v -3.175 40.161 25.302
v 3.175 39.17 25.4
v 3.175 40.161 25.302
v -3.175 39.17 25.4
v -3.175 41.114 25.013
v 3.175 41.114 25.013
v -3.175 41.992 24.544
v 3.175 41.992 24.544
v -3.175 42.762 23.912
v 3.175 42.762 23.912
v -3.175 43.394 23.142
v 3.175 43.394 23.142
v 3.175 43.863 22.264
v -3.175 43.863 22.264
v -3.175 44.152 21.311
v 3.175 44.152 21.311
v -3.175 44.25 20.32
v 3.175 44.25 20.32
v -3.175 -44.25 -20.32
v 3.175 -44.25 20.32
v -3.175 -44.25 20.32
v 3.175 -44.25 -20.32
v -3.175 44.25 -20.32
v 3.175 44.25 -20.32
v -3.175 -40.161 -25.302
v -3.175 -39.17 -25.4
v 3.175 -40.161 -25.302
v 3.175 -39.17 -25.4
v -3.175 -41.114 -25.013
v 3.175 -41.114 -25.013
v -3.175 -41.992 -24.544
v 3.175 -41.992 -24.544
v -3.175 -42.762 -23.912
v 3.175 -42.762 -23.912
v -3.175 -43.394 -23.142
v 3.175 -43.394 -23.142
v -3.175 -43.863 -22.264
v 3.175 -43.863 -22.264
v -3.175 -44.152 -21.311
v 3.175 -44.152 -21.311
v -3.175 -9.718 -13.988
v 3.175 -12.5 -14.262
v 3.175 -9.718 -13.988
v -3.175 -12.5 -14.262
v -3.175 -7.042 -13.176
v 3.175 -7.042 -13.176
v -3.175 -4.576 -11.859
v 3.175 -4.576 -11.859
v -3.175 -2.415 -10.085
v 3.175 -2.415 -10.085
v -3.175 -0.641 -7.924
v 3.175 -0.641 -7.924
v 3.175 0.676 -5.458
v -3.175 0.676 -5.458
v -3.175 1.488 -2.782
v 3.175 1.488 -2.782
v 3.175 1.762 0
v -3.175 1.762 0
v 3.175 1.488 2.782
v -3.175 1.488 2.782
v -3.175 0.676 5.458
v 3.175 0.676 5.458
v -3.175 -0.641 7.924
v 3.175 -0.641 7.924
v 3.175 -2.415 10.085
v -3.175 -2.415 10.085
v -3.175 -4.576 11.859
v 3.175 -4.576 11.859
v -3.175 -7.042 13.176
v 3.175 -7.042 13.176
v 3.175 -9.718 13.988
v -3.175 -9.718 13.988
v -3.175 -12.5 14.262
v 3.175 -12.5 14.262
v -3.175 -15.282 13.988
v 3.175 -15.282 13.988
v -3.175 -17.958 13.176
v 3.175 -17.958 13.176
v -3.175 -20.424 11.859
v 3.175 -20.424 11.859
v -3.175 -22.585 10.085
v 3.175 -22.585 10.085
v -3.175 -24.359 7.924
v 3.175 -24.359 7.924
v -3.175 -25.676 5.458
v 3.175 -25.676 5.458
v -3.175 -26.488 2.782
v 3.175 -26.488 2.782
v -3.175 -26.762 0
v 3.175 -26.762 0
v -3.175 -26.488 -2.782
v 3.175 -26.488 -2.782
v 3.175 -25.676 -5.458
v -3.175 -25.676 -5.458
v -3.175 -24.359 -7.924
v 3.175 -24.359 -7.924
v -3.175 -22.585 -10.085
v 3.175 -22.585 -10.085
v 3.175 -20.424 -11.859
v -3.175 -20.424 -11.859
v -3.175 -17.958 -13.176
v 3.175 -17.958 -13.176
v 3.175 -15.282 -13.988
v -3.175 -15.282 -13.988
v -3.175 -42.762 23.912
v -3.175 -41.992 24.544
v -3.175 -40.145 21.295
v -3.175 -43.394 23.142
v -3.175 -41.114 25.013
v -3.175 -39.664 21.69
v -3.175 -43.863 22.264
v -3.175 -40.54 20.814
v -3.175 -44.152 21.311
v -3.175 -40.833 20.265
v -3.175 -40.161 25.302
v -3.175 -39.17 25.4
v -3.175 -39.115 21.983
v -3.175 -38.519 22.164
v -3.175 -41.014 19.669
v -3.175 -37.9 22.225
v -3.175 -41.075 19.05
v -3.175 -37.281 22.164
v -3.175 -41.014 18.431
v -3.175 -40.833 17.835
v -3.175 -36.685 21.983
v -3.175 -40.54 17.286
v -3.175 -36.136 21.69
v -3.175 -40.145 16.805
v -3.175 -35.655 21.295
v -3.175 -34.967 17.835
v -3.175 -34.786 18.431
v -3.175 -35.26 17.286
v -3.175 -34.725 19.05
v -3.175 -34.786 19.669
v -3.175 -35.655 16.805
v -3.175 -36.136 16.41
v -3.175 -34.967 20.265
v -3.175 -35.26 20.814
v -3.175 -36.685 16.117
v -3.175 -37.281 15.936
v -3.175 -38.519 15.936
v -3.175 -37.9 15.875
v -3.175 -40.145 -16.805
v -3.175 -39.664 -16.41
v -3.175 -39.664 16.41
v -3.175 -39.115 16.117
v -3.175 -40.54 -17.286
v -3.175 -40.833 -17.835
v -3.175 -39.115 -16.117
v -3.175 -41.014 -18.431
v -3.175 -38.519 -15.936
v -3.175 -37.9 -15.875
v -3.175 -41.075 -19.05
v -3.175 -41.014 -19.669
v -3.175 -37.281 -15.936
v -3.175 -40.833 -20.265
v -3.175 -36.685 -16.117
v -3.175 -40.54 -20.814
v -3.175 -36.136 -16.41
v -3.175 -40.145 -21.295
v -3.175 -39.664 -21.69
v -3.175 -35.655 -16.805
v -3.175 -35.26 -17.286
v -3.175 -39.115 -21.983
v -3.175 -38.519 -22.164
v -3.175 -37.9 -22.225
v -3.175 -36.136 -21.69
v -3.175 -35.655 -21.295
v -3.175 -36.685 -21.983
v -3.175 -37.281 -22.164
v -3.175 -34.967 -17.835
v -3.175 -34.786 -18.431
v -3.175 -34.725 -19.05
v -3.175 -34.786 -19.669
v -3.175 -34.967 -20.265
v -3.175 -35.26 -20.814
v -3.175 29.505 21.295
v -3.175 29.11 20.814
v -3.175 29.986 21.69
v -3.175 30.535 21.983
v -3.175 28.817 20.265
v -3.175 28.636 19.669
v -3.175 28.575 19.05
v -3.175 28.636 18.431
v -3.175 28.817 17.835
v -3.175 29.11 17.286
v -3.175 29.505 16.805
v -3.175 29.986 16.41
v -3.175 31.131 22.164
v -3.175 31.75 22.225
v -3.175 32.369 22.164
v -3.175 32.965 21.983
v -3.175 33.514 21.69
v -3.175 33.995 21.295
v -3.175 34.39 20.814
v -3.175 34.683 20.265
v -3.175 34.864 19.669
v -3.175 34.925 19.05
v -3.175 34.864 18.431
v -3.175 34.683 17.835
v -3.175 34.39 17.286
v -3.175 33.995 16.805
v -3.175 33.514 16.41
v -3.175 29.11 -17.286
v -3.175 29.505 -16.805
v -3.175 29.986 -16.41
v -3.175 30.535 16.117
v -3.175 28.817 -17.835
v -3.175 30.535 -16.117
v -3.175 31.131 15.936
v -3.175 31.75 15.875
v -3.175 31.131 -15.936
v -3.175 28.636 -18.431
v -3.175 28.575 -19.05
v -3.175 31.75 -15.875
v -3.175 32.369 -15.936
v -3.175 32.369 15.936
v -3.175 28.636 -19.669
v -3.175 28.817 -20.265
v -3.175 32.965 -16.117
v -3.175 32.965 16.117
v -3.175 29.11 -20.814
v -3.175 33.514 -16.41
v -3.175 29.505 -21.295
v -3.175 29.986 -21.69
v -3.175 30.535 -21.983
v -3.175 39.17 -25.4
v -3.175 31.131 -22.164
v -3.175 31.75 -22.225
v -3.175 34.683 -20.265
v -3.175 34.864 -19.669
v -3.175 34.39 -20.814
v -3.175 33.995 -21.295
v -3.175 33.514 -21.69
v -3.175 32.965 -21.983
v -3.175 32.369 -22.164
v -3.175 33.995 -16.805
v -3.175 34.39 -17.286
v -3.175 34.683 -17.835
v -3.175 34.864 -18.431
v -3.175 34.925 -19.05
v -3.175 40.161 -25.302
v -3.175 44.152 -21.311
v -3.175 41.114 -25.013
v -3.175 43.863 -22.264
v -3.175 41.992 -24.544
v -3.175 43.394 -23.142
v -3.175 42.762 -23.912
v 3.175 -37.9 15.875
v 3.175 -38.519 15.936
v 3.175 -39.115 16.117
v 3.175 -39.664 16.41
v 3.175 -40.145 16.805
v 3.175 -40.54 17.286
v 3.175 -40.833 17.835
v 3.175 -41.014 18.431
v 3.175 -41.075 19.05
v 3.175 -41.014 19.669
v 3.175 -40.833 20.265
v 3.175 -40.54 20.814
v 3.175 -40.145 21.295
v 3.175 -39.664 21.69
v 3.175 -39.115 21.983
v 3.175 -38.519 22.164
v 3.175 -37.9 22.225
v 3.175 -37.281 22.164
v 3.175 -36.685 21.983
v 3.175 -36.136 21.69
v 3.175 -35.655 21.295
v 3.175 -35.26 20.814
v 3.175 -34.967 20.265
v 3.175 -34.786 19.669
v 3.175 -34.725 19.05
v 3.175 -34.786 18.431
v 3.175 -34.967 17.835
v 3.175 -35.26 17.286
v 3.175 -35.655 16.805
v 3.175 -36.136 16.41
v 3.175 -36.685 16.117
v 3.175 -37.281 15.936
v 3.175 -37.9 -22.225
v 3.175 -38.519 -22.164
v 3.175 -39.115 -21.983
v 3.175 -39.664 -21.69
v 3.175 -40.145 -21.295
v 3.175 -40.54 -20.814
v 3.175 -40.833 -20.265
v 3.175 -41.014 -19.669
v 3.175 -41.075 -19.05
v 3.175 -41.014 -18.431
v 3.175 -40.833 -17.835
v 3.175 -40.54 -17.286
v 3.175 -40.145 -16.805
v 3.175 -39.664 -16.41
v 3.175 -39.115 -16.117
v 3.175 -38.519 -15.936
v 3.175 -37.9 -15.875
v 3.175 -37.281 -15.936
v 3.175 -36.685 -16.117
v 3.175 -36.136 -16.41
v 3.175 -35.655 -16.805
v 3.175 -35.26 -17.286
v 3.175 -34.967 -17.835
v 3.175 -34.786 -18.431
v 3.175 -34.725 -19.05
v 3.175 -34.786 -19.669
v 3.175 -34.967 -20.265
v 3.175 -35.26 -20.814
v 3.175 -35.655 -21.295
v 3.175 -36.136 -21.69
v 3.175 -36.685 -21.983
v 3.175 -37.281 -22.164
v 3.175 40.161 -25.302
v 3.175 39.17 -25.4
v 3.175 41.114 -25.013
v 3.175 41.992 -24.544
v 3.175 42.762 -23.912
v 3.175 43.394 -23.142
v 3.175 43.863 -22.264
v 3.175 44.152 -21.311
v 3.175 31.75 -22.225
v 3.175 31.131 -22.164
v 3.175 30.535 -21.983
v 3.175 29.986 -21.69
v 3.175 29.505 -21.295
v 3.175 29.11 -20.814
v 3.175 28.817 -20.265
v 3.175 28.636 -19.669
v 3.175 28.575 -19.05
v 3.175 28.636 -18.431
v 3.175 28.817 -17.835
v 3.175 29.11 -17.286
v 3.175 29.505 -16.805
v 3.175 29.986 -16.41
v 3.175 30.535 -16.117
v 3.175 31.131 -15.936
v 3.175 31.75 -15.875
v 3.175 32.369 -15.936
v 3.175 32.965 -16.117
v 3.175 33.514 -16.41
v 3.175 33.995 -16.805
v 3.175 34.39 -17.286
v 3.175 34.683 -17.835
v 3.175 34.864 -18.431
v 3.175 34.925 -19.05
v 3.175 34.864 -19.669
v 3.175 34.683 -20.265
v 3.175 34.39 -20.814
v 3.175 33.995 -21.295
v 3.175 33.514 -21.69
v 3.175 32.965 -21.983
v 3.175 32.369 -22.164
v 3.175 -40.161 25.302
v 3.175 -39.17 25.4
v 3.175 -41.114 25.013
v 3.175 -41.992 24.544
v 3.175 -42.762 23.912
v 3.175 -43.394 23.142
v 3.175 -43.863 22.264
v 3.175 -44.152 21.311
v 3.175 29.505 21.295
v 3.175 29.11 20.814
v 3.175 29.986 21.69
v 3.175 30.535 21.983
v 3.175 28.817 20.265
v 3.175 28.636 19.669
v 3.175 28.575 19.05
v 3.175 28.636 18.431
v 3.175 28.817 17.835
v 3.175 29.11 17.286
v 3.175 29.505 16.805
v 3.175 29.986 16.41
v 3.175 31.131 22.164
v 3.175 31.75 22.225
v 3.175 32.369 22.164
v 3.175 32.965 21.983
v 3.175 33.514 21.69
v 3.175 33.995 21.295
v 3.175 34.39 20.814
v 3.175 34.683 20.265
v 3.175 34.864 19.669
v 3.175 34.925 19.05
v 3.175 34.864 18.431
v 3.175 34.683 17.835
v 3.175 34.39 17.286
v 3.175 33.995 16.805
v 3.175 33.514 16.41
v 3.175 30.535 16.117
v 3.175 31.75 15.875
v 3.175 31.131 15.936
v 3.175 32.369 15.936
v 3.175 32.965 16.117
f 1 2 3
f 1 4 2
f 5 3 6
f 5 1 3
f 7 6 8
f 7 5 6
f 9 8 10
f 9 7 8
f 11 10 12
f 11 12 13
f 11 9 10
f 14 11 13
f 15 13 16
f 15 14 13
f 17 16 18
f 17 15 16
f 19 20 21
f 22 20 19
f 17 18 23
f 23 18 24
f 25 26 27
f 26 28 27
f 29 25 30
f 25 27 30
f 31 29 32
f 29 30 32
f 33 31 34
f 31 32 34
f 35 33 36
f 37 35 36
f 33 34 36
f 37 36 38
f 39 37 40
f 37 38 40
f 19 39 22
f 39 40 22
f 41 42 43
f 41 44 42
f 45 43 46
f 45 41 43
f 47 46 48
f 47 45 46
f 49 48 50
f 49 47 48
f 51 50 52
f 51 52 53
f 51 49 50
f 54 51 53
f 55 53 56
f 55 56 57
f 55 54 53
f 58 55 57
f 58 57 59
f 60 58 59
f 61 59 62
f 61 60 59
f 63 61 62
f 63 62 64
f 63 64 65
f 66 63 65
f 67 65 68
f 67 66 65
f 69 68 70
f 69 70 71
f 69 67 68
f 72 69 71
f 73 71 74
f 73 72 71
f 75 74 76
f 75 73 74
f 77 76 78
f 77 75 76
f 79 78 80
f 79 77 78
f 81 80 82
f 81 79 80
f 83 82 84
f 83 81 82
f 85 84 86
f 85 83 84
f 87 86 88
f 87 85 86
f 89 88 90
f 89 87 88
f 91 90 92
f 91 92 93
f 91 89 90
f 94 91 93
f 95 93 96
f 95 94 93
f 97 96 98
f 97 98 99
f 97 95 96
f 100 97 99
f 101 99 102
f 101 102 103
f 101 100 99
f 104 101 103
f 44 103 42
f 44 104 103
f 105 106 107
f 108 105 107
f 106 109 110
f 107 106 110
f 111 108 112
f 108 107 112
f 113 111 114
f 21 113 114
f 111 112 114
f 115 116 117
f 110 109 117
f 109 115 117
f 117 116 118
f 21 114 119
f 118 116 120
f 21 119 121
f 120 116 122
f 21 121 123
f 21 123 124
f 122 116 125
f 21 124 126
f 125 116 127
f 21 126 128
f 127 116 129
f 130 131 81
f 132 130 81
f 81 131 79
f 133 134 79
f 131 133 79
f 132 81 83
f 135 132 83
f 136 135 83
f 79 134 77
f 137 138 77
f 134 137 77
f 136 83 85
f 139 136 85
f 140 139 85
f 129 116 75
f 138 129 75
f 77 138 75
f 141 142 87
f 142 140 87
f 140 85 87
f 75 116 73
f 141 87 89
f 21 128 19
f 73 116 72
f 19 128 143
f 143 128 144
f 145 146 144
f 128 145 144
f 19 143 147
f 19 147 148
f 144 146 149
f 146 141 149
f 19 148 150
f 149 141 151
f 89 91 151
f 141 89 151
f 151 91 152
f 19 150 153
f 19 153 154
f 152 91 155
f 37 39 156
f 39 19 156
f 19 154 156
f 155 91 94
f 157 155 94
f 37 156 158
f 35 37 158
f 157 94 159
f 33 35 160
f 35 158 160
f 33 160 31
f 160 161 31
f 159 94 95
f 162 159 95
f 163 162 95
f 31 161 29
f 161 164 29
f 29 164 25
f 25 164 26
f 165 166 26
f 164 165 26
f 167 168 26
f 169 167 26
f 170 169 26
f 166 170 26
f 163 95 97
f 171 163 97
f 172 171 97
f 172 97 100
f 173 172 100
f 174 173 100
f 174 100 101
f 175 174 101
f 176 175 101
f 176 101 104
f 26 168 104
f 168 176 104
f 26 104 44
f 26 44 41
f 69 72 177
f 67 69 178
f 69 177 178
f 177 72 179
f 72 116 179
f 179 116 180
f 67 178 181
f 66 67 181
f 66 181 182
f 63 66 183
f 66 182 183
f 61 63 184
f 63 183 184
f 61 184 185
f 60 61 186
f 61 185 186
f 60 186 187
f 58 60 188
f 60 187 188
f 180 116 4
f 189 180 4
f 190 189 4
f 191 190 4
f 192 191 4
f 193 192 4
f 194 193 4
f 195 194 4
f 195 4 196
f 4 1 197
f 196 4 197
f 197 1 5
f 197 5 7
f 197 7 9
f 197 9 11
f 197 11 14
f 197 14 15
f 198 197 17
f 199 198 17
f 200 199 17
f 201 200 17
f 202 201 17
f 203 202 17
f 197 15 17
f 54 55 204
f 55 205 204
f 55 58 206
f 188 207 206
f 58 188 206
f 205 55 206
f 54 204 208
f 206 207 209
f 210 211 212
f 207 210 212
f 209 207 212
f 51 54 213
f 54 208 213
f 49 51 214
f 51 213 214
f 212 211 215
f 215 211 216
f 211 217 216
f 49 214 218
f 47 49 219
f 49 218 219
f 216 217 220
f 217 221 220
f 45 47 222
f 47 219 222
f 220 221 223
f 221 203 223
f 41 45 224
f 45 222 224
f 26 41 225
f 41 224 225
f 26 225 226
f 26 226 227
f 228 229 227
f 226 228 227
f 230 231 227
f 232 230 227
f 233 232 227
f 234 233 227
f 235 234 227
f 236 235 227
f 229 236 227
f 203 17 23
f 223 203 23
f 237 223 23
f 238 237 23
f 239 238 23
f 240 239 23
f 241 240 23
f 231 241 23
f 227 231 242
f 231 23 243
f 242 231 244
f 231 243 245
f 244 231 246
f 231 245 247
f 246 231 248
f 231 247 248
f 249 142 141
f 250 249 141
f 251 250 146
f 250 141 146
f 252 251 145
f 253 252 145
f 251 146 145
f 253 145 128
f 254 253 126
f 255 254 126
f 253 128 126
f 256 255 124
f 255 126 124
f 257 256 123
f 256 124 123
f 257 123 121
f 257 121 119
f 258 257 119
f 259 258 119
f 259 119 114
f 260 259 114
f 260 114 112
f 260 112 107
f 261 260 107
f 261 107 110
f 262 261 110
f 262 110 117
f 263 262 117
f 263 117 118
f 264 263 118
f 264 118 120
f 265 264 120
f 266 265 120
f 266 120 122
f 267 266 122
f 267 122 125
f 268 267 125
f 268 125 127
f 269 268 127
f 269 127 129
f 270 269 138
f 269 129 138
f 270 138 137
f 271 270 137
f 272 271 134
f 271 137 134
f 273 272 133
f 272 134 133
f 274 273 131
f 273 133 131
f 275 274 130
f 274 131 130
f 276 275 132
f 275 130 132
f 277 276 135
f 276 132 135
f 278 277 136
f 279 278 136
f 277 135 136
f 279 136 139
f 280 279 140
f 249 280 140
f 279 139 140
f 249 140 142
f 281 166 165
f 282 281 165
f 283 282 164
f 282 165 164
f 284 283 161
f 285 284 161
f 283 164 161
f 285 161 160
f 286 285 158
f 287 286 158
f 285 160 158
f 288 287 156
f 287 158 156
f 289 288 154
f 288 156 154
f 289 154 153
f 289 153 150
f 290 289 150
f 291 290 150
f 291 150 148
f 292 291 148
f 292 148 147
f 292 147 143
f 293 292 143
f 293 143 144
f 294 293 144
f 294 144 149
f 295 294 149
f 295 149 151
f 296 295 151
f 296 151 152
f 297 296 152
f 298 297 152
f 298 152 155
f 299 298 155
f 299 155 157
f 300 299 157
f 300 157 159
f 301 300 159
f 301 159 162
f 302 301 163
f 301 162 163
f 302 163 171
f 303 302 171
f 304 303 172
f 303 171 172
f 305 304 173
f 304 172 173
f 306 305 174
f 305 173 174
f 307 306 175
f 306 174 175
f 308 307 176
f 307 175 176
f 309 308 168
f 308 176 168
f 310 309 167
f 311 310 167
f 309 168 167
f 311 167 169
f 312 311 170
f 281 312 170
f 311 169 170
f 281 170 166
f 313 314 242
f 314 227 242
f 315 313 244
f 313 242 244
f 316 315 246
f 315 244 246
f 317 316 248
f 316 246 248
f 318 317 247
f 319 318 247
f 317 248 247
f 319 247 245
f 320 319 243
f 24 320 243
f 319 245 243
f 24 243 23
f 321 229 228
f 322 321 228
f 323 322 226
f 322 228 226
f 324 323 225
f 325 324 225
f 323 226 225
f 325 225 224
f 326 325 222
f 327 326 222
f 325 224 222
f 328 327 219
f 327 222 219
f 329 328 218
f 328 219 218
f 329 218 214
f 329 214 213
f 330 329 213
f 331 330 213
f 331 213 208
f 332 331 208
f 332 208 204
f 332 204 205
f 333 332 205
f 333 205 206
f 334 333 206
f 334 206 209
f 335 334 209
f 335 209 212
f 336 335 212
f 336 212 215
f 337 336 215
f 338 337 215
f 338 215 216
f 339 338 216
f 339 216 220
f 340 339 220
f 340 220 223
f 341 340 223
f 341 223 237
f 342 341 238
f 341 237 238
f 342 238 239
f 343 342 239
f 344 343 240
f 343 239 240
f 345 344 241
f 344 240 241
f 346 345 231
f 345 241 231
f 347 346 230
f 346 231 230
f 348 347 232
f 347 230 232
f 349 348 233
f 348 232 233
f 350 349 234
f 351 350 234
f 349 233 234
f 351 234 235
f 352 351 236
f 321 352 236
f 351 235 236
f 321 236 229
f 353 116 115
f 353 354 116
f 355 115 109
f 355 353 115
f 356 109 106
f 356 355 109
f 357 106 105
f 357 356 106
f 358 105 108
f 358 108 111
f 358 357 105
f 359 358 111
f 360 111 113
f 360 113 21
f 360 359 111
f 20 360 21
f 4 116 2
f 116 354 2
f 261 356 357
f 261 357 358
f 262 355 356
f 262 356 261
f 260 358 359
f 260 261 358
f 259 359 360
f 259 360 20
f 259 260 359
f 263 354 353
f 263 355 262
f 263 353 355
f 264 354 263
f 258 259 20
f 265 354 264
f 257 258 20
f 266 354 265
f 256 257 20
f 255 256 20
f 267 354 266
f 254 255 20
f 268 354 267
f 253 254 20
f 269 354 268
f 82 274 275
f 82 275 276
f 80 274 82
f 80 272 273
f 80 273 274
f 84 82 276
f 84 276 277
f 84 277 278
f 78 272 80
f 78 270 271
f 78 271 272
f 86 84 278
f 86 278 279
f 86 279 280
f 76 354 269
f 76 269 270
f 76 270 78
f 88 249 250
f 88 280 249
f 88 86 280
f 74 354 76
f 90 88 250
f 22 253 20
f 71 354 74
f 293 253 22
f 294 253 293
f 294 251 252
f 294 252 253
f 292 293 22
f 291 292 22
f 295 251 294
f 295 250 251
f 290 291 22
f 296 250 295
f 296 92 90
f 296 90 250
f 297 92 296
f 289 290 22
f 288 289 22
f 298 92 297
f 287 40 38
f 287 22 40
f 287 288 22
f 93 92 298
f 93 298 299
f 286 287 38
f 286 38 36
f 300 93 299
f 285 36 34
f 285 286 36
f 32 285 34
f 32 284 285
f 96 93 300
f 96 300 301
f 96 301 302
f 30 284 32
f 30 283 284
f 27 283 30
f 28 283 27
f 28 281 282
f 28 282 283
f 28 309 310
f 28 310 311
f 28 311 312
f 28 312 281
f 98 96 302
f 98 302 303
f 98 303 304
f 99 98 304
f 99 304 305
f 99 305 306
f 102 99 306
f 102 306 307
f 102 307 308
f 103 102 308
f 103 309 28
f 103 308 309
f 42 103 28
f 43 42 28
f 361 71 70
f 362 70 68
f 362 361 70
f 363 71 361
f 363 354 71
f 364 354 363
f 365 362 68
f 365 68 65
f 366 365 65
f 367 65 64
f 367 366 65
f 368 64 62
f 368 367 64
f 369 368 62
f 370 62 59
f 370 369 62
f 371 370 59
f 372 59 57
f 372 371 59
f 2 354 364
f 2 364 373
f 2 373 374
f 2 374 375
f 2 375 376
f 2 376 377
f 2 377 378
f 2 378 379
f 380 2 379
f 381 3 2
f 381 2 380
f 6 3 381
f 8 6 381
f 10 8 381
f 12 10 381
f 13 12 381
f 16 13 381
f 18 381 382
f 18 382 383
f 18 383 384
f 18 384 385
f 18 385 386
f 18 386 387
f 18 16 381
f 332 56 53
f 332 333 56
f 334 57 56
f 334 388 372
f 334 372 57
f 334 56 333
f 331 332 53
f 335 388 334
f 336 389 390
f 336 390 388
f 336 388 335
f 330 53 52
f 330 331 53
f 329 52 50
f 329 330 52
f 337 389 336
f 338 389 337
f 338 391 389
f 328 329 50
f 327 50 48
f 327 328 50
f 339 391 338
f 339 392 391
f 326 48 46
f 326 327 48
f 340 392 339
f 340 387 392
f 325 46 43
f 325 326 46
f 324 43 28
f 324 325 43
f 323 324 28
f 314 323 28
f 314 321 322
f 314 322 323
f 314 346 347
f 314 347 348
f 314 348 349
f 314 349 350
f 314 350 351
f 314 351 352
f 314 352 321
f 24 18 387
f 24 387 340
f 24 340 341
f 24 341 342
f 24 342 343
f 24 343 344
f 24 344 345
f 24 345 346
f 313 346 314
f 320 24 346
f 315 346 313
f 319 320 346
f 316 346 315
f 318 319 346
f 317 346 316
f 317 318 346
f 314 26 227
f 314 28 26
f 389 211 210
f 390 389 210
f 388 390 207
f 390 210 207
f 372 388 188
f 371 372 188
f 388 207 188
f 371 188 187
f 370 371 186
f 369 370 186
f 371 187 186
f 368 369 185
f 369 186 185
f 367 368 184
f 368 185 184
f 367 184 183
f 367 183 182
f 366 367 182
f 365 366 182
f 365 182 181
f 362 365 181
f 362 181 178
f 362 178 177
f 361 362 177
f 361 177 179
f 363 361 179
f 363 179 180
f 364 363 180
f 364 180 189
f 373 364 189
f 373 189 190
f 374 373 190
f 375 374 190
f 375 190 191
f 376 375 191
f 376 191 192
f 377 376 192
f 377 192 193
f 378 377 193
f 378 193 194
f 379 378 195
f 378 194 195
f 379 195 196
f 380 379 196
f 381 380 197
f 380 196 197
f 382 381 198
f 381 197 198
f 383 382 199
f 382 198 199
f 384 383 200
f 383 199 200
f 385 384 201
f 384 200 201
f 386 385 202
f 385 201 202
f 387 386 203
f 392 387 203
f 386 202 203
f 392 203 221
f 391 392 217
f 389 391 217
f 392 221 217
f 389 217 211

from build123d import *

# Parameters (mm, degrees)
SKETCH1_W                   = 50.8
SKETCH1_H                   = 88.500000038
SKETCH1_R                   = 14.2621
BOSS_EXTRUDE1_DEPTH         = 3.175
FILLET1_R                   = 5.08
F_1_4_0_25_DIAMETER_HOLE2_D = 6.35


with BuildPart() as part:
    # Sketch1 → Boss-Extrude1 (new, symmetric)
    with BuildSketch(Plane(origin=(0, 0, 0), x_dir=(0, 0, -1), z_dir=(1, 0, 0))):
        Rectangle(SKETCH1_W, SKETCH1_H)
        with Locations((0, -12.500000019)):
            Circle(SKETCH1_R, mode=Mode.SUBTRACT)
    extrude(amount=BOSS_EXTRUDE1_DEPTH, both=True)

    # Fillet1
    fillet1_edges = [part.edges().sort_by_distance(p)[0] for p in [
        (0, -44.250000019, -25.4),
        (0, -44.250000019, 25.4),
        (0, 44.250000019, 25.4),
        (0, 44.250000019, -25.4),
    ]]
    fillet(fillet1_edges, radius=FILLET1_R)

    # 1/4 (0.25) Diameter Hole2 (through all)
    with Locations(Plane(origin=(3.175, -37.900000019, 19.05), x_dir=(0, 0, 1), z_dir=(1, 0, 0))):
        with Locations((0, 0), (-38.1, 0), (0, -69.650000038), (-38.1, -69.650000038)):
            Hole(F_1_4_0_25_DIAMETER_HOLE2_D / 2)


solid = part.part
